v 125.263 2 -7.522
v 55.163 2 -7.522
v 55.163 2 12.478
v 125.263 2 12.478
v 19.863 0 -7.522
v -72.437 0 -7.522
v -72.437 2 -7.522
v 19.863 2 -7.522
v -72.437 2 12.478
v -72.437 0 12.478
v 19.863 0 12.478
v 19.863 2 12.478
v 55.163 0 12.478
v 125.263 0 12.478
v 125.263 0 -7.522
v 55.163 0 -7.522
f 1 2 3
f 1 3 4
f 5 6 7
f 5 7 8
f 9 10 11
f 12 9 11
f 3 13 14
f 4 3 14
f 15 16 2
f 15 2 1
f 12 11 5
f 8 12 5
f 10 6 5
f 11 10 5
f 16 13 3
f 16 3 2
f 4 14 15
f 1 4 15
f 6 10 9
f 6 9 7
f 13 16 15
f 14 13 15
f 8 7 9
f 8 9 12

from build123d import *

# Parameters (mm, degrees)
SKETCH1_W           = 197.7
SKETCH1_H           = 20
BOSS_EXTRUDE1_DEPTH = 2
SKETCH3_W           = 25.3
SKETCH3_H           = 20
CUT_EXTRUDE2_DEPTH  = 10
SKETCH4_W           = 5
SKETCH4_H           = 20
CUT_EXTRUDE3_DEPTH  = 10


with BuildPart() as part:
    # Sketch1 → Boss-Extrude1 (new body)
    with BuildSketch(Plane(origin=(0, 0, 0), x_dir=(1, 0, 0), z_dir=(0, 1, 0))):
        with Locations((26.412848541, -2.477865378)):
            Rectangle(SKETCH1_W, SKETCH1_H)
    extrude(amount=BOSS_EXTRUDE1_DEPTH)

    # Sketch3 → Cut-Extrude2 (cut)
    with BuildSketch(Plane(origin=(0, 0, 0), x_dir=(-1, 0, 0), z_dir=(0, -1, 0))):
        with Locations((-37.512848541, -2.477865378)):
            Rectangle(SKETCH3_W, SKETCH3_H)
    extrude(amount=-CUT_EXTRUDE2_DEPTH, mode=Mode.SUBTRACT)

    # Sketch4 → Cut-Extrude3 (cut)
    with BuildSketch(Plane(origin=(0, 0, 0), x_dir=(-1, 0, 0), z_dir=(0, -1, 0))):
        with Locations((-22.362848541, -2.477865378)):
            Rectangle(SKETCH4_W, SKETCH4_H)
        with Locations((-52.662848541, -2.477865378)):
            Rectangle(SKETCH4_W, SKETCH4_H)
    extrude(amount=-CUT_EXTRUDE3_DEPTH, mode=Mode.SUBTRACT)


solid = part.part
